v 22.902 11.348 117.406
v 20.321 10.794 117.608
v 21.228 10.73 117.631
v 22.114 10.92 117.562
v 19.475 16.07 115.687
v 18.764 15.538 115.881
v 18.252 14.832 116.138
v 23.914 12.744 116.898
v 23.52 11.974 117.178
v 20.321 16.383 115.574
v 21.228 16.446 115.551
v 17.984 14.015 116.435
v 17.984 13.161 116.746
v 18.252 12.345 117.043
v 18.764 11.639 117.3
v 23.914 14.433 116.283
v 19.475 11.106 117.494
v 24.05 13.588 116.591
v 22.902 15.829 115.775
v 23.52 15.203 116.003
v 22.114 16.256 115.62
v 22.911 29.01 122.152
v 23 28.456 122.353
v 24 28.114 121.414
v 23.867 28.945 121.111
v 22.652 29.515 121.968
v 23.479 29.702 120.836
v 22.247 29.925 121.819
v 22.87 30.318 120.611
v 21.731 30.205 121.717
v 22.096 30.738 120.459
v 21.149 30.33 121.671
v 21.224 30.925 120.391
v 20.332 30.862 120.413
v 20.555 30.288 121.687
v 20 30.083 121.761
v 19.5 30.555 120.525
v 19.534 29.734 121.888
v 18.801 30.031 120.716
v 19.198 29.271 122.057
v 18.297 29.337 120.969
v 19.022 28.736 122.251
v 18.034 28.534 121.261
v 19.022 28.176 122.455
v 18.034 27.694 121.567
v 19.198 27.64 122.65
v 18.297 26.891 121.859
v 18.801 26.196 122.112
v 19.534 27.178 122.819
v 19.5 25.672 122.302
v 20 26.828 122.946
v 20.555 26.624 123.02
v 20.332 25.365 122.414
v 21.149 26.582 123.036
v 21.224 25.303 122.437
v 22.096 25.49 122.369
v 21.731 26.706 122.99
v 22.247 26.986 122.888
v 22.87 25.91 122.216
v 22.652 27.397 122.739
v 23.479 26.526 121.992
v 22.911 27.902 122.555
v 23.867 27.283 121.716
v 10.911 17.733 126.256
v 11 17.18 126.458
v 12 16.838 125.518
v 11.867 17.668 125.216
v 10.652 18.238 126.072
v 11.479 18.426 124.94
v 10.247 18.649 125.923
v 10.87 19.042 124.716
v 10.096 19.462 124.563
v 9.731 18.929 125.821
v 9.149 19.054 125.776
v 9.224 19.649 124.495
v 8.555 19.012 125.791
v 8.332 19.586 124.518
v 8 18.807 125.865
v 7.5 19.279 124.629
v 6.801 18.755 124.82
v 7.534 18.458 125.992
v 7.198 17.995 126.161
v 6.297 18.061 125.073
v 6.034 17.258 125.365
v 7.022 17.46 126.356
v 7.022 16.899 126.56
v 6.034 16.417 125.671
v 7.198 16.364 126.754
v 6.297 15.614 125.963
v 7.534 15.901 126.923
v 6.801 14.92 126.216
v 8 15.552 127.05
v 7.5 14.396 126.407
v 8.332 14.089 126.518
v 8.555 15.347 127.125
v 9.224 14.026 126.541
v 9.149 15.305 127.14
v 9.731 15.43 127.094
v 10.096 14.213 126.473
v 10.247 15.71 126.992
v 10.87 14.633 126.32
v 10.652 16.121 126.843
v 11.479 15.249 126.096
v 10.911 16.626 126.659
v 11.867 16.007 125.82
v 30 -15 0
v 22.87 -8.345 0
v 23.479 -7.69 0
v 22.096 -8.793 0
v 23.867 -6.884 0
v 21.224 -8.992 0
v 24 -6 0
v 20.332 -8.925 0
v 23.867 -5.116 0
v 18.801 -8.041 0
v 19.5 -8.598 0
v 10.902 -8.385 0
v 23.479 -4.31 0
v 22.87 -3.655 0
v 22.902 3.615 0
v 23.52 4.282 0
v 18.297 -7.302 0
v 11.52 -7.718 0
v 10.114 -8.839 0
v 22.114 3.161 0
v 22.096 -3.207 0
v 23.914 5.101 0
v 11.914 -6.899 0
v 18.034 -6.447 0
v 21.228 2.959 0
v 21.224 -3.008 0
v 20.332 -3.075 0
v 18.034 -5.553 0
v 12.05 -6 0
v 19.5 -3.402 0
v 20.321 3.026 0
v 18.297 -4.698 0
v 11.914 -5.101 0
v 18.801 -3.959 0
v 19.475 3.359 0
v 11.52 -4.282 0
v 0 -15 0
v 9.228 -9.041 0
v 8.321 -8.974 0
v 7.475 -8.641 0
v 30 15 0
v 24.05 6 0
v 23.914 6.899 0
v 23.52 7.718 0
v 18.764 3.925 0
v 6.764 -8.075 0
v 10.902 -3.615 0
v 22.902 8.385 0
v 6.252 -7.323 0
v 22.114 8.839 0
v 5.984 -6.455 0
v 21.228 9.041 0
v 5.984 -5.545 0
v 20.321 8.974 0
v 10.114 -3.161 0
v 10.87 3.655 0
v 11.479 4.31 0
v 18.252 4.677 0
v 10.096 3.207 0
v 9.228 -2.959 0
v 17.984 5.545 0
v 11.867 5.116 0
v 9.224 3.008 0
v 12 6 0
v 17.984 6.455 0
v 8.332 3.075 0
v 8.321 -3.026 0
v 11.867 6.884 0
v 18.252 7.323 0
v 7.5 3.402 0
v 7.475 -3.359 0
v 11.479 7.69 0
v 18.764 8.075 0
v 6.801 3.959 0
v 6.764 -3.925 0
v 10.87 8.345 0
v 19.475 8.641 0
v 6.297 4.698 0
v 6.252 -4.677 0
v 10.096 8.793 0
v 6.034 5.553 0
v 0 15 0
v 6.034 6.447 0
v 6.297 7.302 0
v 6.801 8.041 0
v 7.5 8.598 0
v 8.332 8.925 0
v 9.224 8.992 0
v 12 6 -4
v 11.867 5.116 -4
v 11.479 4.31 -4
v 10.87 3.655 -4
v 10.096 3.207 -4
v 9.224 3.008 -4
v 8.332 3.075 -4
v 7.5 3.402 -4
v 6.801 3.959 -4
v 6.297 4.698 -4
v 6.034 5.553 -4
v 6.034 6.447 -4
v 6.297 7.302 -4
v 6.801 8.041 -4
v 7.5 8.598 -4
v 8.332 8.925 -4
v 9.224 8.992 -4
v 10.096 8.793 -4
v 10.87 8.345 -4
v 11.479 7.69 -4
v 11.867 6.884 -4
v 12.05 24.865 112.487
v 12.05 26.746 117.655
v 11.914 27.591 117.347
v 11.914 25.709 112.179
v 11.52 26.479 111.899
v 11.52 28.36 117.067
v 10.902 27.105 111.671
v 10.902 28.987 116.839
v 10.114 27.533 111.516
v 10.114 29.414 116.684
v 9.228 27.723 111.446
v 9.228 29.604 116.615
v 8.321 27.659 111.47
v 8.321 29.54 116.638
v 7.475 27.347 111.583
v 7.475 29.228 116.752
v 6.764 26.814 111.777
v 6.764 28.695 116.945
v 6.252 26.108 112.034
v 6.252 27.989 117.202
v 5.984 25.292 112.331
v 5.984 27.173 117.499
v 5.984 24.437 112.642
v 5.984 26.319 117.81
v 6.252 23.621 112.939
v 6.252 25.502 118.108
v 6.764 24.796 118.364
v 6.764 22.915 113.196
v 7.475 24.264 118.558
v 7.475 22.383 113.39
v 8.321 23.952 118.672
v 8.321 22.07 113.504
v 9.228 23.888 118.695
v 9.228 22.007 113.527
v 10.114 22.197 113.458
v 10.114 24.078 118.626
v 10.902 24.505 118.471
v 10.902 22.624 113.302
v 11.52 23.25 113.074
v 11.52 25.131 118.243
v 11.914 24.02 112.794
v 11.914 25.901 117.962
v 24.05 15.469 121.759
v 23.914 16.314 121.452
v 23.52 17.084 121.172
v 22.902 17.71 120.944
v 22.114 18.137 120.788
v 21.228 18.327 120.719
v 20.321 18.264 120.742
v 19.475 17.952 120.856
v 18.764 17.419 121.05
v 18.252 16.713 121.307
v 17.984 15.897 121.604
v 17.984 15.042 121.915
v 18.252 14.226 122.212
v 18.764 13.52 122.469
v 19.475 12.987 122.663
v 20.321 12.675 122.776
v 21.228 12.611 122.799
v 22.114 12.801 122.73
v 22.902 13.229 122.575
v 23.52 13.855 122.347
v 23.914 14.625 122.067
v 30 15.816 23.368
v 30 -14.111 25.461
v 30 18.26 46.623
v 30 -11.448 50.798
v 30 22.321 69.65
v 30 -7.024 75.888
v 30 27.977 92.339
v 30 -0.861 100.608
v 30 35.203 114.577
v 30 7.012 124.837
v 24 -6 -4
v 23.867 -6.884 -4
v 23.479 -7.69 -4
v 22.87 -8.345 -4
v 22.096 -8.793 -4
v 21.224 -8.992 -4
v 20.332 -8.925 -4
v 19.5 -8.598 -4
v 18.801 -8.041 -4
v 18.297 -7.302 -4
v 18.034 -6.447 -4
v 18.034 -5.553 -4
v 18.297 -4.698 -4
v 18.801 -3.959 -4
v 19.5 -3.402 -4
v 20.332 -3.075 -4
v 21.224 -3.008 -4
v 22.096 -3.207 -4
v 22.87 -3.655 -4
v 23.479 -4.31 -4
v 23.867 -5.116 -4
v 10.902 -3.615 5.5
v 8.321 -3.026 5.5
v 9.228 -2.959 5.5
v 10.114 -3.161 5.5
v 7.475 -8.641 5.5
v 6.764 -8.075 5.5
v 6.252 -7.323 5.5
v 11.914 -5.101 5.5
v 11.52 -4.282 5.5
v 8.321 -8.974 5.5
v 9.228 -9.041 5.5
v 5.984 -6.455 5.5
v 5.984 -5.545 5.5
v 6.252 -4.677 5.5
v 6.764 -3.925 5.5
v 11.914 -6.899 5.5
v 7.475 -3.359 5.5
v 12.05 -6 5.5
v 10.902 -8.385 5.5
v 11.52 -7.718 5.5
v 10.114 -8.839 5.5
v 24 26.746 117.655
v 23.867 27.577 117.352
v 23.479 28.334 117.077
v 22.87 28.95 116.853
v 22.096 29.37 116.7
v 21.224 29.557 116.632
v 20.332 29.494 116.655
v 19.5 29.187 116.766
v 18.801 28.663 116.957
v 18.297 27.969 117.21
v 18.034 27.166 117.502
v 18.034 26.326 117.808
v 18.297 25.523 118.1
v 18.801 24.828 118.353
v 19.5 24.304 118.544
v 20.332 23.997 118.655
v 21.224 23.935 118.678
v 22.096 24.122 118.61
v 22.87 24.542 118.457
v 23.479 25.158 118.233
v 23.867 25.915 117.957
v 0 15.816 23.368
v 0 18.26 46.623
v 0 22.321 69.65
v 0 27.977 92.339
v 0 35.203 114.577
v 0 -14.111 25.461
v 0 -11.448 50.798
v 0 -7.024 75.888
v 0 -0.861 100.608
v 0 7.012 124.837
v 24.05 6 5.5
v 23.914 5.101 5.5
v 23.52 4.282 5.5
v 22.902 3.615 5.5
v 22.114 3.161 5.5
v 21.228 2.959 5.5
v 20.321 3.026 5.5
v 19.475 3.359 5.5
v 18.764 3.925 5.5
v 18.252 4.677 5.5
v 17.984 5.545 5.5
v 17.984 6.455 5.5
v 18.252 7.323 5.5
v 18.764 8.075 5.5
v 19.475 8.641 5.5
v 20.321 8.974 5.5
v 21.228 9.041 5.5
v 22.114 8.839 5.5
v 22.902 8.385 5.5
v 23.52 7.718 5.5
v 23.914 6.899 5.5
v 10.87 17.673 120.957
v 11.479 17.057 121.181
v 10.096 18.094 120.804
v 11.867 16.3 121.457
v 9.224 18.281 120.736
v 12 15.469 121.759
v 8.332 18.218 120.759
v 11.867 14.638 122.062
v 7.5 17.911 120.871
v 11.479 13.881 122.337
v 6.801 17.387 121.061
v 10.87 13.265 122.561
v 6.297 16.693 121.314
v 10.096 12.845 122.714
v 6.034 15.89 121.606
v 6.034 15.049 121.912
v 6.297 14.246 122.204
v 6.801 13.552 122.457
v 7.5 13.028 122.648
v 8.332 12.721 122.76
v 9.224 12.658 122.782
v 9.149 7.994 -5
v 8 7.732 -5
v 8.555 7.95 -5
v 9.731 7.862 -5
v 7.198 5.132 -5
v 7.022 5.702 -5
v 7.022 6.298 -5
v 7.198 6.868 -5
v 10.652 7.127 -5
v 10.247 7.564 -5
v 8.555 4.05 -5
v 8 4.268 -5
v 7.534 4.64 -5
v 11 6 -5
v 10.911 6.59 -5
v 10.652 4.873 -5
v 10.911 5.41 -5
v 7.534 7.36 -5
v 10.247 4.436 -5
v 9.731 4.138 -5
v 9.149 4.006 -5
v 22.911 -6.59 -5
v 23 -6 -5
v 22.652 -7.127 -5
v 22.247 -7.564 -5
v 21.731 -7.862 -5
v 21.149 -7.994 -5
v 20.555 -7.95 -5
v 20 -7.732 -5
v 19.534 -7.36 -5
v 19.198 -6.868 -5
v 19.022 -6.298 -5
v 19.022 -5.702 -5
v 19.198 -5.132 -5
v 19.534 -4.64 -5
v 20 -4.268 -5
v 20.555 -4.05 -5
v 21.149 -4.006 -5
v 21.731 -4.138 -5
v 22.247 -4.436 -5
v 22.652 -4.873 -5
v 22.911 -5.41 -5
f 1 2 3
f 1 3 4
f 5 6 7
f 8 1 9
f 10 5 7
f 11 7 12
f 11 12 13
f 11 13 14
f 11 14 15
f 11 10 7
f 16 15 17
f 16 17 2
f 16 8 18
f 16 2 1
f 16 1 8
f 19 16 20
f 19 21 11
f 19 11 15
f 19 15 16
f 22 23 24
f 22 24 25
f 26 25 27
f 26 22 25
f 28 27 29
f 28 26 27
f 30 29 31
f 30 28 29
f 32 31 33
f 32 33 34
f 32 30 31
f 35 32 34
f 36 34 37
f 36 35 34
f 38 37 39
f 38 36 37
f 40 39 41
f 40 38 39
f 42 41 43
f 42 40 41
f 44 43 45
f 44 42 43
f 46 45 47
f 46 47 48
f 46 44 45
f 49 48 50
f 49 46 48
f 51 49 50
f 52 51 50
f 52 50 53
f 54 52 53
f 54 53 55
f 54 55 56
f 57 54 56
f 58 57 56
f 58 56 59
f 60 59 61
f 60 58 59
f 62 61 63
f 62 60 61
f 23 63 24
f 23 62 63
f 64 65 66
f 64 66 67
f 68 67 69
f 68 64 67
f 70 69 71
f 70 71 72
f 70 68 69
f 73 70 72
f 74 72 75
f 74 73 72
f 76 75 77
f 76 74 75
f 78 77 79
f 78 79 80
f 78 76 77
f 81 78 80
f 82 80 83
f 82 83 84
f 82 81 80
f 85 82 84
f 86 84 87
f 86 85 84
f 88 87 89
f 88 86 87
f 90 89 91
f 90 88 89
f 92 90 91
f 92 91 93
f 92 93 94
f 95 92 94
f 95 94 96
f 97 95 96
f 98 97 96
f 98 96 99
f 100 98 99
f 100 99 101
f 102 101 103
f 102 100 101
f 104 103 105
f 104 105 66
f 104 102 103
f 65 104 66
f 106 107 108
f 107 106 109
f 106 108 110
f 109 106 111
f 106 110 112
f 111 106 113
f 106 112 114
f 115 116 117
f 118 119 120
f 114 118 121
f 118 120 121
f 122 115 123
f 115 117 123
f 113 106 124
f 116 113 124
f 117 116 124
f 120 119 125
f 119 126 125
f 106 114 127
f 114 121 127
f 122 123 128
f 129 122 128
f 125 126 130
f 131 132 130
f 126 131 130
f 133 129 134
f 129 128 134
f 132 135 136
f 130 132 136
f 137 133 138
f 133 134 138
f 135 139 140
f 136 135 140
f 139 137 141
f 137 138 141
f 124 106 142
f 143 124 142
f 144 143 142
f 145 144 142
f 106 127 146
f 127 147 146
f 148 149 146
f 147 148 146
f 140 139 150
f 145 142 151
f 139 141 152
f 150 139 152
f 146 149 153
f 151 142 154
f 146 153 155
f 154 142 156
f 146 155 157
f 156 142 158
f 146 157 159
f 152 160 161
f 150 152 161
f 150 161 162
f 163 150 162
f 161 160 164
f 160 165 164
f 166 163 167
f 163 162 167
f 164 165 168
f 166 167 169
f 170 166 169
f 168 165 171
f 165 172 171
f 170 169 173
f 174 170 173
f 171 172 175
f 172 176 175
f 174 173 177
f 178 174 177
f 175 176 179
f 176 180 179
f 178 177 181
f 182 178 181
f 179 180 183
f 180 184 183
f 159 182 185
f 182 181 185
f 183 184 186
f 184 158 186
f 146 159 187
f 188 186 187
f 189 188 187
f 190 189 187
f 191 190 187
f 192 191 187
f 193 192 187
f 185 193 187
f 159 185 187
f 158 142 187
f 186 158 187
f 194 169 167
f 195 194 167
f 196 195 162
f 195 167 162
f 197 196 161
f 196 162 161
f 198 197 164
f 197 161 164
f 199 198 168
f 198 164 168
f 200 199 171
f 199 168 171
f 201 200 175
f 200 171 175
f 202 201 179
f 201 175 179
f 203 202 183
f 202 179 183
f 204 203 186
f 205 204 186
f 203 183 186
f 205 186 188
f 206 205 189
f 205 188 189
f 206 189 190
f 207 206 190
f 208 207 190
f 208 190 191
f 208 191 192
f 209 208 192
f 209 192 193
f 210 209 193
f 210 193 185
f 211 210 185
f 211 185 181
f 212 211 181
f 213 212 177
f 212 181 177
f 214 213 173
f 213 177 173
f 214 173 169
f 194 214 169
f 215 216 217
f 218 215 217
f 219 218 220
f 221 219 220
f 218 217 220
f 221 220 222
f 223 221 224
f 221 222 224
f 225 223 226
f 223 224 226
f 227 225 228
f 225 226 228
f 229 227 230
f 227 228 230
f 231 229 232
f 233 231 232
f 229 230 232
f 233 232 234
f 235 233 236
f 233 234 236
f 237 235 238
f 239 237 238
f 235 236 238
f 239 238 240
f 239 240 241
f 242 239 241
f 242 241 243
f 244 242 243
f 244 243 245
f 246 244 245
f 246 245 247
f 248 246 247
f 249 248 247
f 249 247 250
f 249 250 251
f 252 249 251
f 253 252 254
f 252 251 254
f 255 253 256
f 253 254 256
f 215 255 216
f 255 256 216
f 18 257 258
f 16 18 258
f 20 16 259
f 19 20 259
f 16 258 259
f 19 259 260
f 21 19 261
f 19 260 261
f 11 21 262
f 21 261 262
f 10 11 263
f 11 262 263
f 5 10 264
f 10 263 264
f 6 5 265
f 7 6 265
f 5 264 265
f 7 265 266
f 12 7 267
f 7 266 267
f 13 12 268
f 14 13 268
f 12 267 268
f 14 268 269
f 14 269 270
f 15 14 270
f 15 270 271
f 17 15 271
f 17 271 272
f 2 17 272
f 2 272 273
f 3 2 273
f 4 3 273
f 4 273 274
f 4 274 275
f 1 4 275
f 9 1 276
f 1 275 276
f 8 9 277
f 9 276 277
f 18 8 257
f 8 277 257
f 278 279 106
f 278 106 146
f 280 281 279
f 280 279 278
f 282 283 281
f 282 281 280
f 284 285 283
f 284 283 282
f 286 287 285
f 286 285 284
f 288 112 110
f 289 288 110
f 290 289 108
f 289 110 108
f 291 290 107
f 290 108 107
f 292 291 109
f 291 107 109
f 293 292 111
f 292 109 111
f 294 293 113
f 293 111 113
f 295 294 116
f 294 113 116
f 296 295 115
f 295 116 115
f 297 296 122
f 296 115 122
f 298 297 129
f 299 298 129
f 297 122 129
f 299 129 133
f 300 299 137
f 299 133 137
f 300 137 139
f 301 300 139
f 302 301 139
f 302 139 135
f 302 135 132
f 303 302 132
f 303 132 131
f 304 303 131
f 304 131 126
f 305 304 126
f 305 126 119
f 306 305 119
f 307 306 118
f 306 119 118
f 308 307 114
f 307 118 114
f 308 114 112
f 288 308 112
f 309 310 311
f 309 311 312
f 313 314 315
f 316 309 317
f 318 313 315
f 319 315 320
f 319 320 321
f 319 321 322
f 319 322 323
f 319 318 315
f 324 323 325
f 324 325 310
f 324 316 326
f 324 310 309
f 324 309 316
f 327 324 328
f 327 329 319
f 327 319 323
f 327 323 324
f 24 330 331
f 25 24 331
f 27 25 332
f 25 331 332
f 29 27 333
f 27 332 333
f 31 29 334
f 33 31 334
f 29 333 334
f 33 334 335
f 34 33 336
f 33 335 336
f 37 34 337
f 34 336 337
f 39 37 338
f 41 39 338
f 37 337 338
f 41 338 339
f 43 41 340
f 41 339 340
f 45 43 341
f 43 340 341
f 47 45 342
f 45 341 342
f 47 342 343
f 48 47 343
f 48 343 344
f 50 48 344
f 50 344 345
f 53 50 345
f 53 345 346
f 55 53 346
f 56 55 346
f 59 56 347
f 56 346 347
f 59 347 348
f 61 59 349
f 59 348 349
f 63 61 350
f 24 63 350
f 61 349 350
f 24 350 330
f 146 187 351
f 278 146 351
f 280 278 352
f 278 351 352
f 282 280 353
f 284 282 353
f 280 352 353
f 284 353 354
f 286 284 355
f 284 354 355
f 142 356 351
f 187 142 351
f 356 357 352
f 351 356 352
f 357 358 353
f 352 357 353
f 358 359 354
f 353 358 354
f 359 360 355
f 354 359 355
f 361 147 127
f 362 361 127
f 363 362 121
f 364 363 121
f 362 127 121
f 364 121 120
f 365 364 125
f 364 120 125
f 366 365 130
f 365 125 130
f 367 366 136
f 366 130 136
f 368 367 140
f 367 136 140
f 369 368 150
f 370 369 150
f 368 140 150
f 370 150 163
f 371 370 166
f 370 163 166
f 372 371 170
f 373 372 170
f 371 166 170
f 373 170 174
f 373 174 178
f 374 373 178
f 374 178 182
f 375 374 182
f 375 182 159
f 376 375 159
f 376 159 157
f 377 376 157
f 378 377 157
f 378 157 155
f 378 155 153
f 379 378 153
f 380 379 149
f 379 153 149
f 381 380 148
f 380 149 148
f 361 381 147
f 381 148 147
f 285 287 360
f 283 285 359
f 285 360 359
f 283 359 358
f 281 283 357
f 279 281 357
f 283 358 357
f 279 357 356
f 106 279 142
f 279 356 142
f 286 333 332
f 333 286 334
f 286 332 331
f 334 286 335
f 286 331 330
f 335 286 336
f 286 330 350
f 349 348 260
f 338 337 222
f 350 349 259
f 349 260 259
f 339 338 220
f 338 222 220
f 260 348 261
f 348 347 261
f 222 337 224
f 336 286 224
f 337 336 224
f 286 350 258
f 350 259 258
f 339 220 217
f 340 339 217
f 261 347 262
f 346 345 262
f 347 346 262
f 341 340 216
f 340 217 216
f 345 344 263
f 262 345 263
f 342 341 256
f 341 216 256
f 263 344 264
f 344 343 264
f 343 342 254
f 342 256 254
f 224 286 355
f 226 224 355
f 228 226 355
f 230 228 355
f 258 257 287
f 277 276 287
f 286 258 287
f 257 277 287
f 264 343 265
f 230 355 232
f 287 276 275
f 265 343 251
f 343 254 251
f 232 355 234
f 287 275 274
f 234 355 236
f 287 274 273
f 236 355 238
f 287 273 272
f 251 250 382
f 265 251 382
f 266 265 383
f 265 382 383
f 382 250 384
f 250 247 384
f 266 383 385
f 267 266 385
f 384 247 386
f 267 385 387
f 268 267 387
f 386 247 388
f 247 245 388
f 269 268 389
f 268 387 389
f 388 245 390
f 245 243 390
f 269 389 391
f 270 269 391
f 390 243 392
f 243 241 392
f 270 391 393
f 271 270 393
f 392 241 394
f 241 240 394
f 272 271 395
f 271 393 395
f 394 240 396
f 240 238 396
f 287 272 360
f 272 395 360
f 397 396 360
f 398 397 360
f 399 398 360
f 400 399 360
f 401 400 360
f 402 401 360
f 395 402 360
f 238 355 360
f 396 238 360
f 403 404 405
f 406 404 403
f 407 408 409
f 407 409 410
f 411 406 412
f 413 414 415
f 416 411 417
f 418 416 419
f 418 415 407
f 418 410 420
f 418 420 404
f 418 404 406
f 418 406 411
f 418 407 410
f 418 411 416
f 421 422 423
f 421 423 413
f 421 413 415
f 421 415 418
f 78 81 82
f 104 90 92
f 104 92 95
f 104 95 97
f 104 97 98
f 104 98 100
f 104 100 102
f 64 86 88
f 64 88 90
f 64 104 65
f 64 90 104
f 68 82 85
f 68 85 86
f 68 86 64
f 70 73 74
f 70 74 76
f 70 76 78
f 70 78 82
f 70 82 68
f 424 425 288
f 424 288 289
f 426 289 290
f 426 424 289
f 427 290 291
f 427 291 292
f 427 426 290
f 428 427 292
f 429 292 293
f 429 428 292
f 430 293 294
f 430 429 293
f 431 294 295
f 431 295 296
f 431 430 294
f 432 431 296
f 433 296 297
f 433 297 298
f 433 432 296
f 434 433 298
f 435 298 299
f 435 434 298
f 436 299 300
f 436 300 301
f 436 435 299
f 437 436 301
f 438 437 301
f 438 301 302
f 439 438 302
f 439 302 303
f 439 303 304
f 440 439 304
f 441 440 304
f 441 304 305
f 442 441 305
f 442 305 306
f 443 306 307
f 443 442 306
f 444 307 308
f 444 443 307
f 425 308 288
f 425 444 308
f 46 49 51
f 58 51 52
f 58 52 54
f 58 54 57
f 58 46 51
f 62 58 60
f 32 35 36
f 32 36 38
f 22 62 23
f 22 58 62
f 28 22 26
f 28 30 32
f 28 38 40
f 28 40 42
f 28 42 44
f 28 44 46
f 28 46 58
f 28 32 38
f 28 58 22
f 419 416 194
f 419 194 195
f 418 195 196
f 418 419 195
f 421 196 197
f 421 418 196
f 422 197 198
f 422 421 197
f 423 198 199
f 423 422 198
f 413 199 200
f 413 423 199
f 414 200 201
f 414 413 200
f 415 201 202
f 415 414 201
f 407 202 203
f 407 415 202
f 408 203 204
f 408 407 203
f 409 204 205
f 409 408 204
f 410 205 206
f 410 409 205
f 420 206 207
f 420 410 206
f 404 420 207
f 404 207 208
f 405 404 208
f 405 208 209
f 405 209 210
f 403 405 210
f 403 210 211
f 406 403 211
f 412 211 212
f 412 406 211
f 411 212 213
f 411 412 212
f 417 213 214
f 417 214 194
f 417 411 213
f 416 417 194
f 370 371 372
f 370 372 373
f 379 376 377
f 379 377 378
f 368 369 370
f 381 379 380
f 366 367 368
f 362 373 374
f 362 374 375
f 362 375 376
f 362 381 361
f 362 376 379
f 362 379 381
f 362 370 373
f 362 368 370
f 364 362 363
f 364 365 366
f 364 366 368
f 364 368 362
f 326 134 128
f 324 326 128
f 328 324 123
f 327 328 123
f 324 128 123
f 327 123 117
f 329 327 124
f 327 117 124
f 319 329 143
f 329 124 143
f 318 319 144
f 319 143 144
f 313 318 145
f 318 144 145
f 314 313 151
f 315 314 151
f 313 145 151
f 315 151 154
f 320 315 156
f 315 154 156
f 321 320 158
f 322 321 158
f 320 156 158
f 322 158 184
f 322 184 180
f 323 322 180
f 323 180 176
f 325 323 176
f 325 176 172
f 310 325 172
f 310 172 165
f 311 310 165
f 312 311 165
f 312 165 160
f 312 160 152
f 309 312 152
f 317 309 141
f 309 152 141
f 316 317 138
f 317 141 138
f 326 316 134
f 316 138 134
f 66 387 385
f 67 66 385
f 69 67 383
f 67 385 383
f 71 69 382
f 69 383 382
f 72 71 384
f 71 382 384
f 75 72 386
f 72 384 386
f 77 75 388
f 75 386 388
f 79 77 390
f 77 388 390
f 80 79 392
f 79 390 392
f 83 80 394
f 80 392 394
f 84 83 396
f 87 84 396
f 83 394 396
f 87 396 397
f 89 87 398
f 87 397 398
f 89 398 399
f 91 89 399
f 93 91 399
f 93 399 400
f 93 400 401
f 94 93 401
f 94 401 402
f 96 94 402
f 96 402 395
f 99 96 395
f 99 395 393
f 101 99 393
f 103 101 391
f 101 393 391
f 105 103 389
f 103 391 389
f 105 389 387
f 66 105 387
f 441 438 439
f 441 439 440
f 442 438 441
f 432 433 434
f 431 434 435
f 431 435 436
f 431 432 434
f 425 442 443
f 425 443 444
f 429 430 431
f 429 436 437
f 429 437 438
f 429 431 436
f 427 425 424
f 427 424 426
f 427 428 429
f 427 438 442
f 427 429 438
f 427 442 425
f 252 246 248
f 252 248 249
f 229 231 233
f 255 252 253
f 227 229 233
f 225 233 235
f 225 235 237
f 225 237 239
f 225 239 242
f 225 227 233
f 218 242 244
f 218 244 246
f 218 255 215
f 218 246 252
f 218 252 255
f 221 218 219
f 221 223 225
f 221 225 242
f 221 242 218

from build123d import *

# Parameters (mm, degrees)
F1_DEPTH  = 30
F2_R      = 3
F3_DEPTH  = 5
F4_SIZE   = 1
F5_R      = 3
F6_DEPTH  = 5
F7_SIZE   = 1
F8_R      = 3.05
F9_DEPTH  = 5.5
F10_R     = 3.05
F11_DEPTH = 5.5


with BuildPart() as f1:
    # F0 (on Right) → F1 (new body)
    with BuildSketch(Plane.YZ):
        with BuildLine():
            ThreePointArc((7.0121934131, 124.8373523139), (-9.4548298495, 63.3815848484), (-15, 0))
            Line((-15, 0), (15, 0))
            ThreePointArc((15, 0), (20.0894027409, 58.1721395184), (35.2029720367, 114.5767480141))
            Line((35.2029720367, 114.5767480141), (7.0121934131, 124.8373523139))
        make_face()
    extrude(amount=F1_DEPTH)

    # F2 (on face) → F3 (join)
    with BuildSketch(Plane(origin=(0, 40.9422224542, 112.4878316951), x_dir=(1, 0, 0), z_dir=(0, 0.3420201433, 0.9396926208))):
        with Locations((9, -27.1075827249)):
            Circle(F2_R)
        with Locations((21, -15.1075827249)):
            Circle(F2_R)
    extrude(amount=F3_DEPTH)

    # F4
    f4_edges = [f1.edges().sort_by_distance(p)[0] for p in [
        (6, 17.179528, 126.457634),
        (18, 28.455839, 122.353392),
    ]]
    chamfer(f4_edges, length=F4_SIZE)

    # F5 (on face) → F6 (join)
    with BuildSketch(Plane(origin=(0, 0, 0), x_dir=(1, 0, 0), z_dir=(0, 0, -1))):
        with Locations((9, -6)):
            Circle(F5_R)
        with Locations((21, 6)):
            Circle(F5_R)
    extrude(amount=F6_DEPTH)

    # F7
    f7_edges = [f1.edges().sort_by_distance(p)[0] for p in [
        (6, 6, -5),
        (18, -6, -5),
    ]]
    chamfer(f7_edges, length=F7_SIZE)

    # F8 (on face) → F9 (cut)
    with BuildSketch(Plane(origin=(0, 40.9422224542, 112.4878316951), x_dir=(1, 0, 0), z_dir=(0, 0.3420201433, 0.9396926208))):
        with Locations((9, -15.1075827249)):
            Circle(F8_R)
        with Locations((21, -27.1075827249)):
            Circle(F8_R)
    extrude(amount=-F9_DEPTH, mode=Mode.SUBTRACT)

    # F10 (on face) → F11 (cut)
    with BuildSketch(Plane(origin=(0, 0, 0), x_dir=(1, 0, 0), z_dir=(0, 0, -1))):
        with Locations((9, 6)):
            Circle(F10_R)
        with Locations((21, -6)):
            Circle(F10_R)
    extrude(amount=-F11_DEPTH, mode=Mode.SUBTRACT)


solid = f1.part
